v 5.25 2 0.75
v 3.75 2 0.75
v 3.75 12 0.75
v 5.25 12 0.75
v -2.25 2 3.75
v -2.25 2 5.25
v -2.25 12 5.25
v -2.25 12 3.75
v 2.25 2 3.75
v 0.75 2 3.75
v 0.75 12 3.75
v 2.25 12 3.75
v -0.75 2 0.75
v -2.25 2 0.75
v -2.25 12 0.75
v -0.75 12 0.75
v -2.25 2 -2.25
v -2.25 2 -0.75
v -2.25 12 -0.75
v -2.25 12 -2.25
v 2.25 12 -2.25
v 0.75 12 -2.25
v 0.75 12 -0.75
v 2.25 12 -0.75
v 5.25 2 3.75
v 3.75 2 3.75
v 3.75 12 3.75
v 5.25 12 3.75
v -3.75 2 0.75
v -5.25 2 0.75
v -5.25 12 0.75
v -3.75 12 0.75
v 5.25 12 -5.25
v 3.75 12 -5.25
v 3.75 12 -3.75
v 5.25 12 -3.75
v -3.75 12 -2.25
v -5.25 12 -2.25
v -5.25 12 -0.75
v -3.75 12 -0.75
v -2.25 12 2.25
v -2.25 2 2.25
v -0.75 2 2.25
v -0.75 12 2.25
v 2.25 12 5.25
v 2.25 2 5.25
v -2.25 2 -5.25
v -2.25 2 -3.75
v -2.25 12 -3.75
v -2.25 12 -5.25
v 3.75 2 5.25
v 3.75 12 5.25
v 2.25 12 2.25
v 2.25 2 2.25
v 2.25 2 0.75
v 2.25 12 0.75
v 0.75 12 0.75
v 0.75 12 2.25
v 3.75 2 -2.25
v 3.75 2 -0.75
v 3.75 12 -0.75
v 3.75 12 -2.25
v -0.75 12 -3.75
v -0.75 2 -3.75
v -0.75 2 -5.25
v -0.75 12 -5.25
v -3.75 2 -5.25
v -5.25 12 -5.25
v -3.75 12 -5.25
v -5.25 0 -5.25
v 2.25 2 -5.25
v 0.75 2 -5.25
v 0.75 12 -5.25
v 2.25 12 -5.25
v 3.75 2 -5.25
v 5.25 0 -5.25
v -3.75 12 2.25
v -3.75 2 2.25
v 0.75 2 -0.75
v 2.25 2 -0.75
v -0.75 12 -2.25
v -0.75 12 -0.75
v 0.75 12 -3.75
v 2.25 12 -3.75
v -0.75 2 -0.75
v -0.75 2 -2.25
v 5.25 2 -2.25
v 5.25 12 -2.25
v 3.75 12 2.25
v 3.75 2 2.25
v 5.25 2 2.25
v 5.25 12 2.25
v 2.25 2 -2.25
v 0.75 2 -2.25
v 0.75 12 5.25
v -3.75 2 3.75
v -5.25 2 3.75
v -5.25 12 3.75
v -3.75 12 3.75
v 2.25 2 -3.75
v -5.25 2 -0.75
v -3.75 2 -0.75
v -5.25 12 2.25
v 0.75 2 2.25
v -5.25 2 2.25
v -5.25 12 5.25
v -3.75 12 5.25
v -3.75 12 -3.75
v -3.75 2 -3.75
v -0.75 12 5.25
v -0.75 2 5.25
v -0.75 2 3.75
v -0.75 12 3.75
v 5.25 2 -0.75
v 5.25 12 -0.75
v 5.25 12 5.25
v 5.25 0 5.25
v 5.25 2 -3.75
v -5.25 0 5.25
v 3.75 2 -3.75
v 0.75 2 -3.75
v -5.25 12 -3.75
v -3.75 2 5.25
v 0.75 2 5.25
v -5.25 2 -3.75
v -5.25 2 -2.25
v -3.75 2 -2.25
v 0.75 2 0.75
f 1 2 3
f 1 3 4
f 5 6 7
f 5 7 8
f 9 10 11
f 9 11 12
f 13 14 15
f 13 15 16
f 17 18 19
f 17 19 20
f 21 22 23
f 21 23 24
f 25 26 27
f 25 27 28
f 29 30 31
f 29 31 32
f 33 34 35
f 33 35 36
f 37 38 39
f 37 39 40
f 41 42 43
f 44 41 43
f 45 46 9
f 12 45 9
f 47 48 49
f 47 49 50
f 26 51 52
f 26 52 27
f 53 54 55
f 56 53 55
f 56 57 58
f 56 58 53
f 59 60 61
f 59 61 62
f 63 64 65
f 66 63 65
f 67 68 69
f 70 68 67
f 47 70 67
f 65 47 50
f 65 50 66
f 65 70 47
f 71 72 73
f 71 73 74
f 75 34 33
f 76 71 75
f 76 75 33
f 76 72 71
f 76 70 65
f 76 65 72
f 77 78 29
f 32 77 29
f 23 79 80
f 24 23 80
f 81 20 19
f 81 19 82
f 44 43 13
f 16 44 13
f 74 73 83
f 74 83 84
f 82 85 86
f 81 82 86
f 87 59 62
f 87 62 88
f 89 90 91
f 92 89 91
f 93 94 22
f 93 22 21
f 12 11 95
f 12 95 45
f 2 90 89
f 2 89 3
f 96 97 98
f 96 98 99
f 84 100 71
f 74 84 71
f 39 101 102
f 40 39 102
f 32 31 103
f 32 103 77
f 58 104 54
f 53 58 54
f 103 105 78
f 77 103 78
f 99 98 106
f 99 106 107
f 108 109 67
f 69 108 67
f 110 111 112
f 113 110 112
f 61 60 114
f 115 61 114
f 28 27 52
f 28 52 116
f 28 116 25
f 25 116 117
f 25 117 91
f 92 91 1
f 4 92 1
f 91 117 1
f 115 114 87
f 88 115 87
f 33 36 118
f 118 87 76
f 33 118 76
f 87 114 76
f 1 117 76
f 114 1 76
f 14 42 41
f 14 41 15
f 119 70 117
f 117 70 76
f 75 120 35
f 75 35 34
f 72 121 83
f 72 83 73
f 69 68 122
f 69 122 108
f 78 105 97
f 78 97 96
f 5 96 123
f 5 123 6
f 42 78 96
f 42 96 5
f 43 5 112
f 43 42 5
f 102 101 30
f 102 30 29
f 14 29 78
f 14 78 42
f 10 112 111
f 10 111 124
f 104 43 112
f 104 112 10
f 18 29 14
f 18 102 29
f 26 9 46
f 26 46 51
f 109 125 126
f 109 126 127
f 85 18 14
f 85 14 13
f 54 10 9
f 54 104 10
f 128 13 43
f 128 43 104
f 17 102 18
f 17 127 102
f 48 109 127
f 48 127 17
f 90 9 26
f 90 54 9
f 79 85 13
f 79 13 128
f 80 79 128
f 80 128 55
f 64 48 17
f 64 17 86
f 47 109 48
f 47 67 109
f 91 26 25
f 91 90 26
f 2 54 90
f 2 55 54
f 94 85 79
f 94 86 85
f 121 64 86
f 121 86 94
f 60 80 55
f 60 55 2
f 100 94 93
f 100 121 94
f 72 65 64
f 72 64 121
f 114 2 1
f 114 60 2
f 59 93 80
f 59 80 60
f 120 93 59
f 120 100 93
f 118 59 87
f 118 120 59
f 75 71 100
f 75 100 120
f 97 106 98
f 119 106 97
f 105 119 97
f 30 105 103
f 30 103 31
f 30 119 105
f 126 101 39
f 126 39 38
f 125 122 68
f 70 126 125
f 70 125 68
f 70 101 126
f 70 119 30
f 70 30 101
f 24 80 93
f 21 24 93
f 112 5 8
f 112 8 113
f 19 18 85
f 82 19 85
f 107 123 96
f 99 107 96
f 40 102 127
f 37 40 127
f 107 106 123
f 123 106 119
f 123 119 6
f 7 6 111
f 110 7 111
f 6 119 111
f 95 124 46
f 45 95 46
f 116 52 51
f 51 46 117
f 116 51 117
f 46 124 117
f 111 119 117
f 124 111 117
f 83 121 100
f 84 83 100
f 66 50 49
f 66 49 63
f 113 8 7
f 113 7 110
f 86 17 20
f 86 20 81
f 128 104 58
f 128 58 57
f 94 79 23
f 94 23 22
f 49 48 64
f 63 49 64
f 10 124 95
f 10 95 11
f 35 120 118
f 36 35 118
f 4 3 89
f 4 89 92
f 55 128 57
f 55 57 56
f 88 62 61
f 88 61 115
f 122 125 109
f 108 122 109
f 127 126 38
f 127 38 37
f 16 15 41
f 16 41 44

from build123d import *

# Parameters (mm, degrees)
SKETCH1_W            = 10.5
SKETCH1_H            = 10.5
BOSS_EXTRUDE1_DEPTH  = 2
SKETCH2_W            = 1.5
SKETCH2_H            = 1.5
BOSS_EXTRUDE2_DEPTH  = 10
LPATTERN1_COUNT      = 4
LPATTERN1_PITCH      = 3
LPATTERN1_COUNT_DIR2 = 4
LPATTERN1_PITCH_DIR2 = 3


with BuildPart() as part:
    # Sketch1 → Boss-Extrude1 (new body)
    with BuildSketch(Plane(origin=(0, 0, 0), x_dir=(1, 0, 0), z_dir=(0, 1, 0))):
        Rectangle(SKETCH1_W, SKETCH1_H)
    extrude(amount=BOSS_EXTRUDE1_DEPTH)

    # Sketch2 → Boss-Extrude2 (add)
    with BuildSketch(Plane(origin=(0, 2, 0), x_dir=(1, 0, 0), z_dir=(0, 1, 0))):
        with Locations((-4.5, 4.5)):
            Rectangle(SKETCH2_W, SKETCH2_H)
    boss_extrude2 = extrude(amount=BOSS_EXTRUDE2_DEPTH)

    # LPattern1: Boss-Extrude2 4 × 4
    with Locations(*[(i * LPATTERN1_PITCH, 0, j * LPATTERN1_PITCH_DIR2) for i in range(LPATTERN1_COUNT) for j in range(LPATTERN1_COUNT_DIR2) if (i, j) != (0, 0)]):
        add(boss_extrude2)


solid = part.part
